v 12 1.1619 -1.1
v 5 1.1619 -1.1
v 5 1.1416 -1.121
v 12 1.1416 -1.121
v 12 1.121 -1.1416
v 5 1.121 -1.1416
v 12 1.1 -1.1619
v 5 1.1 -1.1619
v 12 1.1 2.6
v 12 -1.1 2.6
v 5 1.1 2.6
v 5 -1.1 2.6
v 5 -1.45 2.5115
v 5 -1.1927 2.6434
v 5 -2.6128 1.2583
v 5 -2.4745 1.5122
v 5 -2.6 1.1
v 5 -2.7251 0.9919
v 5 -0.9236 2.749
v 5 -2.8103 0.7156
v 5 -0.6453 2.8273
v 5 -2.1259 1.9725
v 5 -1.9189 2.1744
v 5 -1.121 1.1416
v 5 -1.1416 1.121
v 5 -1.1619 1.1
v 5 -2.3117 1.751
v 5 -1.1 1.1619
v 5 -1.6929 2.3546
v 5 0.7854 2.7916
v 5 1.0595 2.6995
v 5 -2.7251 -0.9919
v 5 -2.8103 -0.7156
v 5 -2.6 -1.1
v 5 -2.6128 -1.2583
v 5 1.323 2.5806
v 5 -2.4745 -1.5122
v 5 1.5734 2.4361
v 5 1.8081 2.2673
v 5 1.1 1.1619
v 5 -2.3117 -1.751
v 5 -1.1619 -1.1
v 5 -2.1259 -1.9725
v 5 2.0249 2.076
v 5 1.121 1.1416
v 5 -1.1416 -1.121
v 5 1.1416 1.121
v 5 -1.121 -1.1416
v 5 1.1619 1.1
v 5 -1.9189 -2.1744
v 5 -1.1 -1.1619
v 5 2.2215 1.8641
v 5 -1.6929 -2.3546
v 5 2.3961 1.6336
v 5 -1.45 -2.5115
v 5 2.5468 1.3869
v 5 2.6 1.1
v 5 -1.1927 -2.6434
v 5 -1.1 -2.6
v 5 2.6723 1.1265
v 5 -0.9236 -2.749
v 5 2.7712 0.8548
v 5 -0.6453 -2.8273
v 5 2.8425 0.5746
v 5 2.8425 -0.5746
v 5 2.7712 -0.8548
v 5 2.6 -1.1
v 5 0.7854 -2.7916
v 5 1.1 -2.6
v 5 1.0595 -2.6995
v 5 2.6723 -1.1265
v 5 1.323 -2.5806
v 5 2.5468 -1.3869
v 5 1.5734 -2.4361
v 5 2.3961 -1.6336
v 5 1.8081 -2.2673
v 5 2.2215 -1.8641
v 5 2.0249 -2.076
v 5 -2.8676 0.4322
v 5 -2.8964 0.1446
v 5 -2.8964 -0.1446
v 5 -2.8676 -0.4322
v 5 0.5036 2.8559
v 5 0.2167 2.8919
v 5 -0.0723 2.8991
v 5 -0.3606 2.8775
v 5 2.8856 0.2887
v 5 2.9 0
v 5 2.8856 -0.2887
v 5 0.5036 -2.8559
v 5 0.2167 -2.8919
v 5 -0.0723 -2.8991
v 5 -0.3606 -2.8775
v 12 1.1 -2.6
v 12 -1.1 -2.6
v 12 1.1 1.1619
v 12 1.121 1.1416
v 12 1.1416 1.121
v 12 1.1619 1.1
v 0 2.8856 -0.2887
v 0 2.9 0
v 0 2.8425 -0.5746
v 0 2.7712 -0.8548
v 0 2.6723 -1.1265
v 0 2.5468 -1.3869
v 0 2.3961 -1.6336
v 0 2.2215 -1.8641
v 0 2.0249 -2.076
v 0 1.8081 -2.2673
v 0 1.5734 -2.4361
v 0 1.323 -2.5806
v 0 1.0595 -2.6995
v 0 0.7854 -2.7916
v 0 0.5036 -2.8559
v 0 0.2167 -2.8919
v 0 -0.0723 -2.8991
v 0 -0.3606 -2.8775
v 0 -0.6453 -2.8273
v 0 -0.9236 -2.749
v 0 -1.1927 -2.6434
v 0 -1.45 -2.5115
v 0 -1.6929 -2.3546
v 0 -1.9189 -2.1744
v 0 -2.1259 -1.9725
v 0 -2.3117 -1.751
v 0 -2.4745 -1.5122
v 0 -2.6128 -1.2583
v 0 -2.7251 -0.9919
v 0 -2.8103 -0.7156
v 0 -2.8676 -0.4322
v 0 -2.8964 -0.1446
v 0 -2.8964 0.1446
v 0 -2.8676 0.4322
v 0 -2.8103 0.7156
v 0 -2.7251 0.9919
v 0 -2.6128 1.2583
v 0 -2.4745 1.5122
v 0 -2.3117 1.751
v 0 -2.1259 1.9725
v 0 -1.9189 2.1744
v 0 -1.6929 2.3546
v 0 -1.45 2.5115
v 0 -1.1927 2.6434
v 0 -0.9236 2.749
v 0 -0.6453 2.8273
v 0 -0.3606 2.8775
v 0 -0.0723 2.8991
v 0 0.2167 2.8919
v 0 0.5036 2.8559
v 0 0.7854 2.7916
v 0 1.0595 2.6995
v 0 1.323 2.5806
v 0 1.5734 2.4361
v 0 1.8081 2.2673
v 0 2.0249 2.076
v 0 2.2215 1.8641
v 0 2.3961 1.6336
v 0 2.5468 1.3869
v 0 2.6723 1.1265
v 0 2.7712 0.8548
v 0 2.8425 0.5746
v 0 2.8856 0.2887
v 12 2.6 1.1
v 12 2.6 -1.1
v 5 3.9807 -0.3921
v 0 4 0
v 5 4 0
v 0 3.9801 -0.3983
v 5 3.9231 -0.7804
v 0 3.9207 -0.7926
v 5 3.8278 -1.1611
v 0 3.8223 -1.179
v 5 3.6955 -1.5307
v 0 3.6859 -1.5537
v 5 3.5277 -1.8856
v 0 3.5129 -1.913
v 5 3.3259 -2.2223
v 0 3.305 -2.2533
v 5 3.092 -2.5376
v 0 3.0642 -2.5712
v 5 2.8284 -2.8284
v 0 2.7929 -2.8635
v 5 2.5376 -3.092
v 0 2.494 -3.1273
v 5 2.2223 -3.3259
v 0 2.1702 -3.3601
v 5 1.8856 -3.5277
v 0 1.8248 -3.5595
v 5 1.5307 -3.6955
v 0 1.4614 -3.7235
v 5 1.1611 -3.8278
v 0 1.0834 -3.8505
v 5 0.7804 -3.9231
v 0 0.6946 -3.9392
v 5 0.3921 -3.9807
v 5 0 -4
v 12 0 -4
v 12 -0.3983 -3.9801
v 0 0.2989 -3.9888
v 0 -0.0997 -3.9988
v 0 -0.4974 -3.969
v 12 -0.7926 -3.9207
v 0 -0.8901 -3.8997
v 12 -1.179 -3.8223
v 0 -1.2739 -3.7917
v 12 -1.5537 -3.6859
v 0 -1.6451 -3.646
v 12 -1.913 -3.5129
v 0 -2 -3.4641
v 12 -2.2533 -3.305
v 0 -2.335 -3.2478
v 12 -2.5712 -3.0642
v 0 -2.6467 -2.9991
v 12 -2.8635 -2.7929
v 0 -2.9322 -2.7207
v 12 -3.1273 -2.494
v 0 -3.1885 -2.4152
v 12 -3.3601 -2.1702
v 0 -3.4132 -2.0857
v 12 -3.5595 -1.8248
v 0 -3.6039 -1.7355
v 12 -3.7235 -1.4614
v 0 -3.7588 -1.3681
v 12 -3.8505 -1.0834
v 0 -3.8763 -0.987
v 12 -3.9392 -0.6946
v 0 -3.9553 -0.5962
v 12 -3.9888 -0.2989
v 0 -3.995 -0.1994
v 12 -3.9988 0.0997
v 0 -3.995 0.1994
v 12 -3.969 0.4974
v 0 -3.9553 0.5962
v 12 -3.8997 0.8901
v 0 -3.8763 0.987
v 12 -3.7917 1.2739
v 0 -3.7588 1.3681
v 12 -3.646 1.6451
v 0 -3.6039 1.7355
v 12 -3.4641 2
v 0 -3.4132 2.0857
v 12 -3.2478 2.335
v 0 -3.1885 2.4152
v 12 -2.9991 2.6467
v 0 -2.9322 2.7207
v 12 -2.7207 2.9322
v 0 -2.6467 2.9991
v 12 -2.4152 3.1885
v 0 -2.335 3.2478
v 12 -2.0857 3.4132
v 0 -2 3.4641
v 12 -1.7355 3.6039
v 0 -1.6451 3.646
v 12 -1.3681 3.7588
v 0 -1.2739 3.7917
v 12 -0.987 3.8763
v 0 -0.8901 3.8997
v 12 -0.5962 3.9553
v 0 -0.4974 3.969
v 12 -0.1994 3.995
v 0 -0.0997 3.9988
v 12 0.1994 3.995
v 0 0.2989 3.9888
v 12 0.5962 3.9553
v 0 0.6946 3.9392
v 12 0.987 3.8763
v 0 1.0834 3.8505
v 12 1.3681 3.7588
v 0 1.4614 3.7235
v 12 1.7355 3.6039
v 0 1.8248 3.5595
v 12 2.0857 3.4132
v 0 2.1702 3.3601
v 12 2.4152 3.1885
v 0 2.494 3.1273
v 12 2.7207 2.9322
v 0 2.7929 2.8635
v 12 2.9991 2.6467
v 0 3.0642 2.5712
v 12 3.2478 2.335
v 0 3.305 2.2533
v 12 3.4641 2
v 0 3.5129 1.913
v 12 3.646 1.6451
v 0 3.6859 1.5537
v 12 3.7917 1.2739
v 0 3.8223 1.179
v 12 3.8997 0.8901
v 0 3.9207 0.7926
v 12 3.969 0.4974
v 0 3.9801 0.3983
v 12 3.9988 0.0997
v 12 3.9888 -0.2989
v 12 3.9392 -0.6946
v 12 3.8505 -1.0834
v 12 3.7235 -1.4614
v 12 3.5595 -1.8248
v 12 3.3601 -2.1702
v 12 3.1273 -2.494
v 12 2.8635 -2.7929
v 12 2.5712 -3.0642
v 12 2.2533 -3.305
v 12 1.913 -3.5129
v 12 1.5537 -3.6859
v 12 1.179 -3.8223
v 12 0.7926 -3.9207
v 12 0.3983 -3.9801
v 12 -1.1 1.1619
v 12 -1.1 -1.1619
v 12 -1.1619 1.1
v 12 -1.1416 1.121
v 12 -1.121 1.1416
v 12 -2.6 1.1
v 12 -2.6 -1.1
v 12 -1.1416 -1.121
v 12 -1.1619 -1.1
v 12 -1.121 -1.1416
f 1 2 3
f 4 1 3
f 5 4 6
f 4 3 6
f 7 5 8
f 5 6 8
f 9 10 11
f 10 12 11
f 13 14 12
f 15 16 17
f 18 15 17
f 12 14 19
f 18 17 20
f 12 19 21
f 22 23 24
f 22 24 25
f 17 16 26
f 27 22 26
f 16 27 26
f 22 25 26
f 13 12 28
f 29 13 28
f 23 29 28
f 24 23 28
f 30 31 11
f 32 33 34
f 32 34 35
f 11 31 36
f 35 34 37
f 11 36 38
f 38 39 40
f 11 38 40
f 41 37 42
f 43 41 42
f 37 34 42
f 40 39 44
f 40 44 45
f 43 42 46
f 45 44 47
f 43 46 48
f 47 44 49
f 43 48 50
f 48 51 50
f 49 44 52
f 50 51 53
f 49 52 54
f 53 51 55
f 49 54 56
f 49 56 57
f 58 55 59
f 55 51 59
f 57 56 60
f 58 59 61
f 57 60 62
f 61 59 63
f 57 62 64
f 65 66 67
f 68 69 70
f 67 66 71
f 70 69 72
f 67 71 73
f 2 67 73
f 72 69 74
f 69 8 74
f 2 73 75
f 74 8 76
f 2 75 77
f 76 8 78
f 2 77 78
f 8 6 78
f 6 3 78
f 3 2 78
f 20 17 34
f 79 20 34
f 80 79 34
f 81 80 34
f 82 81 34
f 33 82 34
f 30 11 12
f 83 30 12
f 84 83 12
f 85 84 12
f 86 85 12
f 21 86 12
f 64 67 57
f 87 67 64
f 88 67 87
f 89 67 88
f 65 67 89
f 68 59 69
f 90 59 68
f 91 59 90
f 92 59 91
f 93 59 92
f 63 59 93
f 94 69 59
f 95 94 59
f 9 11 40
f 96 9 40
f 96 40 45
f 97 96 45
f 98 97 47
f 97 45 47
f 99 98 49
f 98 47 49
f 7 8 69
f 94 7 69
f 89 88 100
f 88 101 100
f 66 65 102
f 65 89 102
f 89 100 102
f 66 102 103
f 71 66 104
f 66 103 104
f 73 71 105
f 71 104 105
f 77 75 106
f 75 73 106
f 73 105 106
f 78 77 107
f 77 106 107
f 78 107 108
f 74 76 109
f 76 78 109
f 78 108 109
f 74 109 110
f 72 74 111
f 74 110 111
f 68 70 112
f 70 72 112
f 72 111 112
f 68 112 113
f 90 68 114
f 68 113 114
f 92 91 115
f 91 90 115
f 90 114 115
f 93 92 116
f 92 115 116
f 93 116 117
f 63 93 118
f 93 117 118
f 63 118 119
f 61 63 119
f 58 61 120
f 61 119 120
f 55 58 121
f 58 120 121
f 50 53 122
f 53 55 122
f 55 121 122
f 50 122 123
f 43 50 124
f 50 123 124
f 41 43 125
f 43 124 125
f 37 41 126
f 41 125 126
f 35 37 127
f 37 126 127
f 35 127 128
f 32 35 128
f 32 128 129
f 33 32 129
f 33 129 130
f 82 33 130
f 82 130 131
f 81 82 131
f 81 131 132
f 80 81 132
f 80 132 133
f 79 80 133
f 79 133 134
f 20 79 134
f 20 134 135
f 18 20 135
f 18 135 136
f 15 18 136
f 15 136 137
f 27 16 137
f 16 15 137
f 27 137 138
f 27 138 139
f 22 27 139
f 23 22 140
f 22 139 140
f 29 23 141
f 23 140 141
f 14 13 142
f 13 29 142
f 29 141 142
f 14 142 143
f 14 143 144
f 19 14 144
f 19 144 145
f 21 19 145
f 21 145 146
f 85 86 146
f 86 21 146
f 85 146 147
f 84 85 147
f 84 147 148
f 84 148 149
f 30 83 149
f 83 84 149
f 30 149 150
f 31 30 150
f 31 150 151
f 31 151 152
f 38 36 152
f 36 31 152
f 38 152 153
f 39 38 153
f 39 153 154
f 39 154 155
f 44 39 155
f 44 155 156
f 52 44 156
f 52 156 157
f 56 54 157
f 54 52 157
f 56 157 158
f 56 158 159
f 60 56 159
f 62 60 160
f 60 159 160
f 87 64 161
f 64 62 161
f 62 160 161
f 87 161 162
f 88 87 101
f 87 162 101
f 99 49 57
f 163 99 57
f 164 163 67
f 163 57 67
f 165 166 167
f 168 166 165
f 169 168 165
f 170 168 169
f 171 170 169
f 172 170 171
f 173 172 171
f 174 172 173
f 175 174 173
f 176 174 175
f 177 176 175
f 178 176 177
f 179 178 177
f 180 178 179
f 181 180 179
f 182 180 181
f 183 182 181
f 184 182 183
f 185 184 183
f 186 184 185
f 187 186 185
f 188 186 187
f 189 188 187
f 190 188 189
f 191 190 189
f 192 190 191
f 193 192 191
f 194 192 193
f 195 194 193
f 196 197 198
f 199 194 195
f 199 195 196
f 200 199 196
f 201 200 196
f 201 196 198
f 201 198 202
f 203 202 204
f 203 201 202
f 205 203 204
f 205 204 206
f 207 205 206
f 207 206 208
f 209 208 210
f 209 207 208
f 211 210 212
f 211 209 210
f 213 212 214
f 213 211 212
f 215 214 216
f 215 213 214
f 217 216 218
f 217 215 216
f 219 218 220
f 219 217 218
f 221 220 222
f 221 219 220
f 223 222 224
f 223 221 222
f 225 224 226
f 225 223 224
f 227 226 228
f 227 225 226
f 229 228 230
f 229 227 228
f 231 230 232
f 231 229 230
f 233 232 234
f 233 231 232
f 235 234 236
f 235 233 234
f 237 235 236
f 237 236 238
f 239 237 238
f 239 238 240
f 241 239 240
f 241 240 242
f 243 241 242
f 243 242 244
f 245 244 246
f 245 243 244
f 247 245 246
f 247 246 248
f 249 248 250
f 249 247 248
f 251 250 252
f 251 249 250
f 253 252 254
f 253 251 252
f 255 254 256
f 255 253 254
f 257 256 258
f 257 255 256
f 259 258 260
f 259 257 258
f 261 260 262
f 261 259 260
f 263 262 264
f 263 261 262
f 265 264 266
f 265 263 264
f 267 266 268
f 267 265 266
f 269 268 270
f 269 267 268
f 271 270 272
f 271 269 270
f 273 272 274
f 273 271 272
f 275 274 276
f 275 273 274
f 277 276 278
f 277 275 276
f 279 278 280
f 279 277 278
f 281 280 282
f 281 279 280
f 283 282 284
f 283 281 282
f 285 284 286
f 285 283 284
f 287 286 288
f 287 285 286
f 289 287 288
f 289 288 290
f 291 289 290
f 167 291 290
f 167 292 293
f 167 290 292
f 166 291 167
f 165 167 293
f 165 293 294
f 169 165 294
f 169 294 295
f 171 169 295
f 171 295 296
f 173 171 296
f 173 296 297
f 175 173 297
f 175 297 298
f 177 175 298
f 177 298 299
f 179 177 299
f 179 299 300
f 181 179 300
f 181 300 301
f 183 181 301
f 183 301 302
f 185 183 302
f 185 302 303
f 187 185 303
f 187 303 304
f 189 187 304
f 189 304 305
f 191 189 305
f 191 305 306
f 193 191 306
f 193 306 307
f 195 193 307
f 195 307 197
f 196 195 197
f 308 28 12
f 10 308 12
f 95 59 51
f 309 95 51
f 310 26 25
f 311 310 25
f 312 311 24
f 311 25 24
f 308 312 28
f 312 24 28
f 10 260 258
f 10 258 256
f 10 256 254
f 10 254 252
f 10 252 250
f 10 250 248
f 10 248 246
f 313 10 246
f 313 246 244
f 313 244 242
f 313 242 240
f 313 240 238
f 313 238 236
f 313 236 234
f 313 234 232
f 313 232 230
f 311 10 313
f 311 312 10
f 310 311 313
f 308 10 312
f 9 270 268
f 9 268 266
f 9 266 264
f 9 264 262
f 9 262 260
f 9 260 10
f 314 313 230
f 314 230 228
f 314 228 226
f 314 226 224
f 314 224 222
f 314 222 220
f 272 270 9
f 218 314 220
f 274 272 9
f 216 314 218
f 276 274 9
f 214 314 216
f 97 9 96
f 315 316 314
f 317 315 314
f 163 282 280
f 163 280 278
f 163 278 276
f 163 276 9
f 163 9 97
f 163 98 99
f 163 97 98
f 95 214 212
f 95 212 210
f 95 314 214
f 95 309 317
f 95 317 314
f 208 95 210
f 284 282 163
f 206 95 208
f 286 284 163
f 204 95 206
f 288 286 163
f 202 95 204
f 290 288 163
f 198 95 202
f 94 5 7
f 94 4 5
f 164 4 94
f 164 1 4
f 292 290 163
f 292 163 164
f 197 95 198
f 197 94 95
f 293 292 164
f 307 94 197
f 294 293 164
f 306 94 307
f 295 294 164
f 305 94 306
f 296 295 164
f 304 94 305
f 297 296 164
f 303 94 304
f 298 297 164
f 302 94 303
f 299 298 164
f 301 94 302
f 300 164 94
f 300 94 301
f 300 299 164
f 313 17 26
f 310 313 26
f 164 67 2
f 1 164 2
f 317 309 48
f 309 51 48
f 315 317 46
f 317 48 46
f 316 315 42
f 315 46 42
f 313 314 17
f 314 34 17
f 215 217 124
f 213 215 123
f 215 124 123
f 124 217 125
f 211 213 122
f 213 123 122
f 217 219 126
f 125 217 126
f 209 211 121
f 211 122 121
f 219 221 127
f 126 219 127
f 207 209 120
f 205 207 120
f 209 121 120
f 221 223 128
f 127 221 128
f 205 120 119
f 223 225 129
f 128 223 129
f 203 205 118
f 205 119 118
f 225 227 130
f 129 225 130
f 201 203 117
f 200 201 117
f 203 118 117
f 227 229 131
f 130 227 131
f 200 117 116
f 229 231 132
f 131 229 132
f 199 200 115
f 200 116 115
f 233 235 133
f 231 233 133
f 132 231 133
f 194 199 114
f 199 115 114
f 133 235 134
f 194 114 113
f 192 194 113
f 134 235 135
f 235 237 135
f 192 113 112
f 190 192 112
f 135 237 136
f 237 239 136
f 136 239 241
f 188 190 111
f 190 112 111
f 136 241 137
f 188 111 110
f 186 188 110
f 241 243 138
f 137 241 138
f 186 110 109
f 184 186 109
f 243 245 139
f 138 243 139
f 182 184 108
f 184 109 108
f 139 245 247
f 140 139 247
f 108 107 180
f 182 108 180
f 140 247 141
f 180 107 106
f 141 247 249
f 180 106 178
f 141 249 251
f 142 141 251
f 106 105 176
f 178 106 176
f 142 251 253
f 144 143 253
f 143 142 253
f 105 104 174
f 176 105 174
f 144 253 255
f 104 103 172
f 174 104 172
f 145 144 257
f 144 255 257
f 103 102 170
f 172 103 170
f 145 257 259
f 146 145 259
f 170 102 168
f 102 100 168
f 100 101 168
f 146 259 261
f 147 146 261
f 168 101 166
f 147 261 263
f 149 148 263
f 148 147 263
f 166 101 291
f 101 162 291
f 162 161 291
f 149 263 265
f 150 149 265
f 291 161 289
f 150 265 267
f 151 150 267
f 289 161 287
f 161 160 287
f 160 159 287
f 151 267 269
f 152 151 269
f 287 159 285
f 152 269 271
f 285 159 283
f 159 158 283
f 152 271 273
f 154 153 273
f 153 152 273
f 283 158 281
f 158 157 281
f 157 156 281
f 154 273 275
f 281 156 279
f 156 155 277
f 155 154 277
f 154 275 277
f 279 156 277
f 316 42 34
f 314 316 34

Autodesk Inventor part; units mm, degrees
ref_plane "YZ Plane" through (0, 0, 0) normal (1, 0, 0) x (0, 1, 0)
ref_plane "XZ Plane" through (0, 0, 0) normal (0, 1, 0) x (-1, 0, 0)
ref_plane "XY Plane" through (0, 0, 0) normal (0, 0, 1) x (1, 0, 0)
sketch "Boceto1" plane through (0, 0, 0) normal (1, 0, 0) x (0, 1, 0)
  circle A0 centre (0, 0) radius 2.9
  line L0 (0, 5) -> (0, 5)
  line L1 (5, 0) -> (5, 0)
  line L2 (0, -5) -> (0, -5)
  line L3 (-5, 0) -> (-5, 0)
  circle A1 centre (0, 0) radius 4
  dimension "d0" = 5.8
  dimension "d11" = 8
extrude "Extrusión1" add sketch "Boceto1" along normal blind 5
sketch "Boceto2" plane through (5, 0, 0) normal (1, 0, 0) x (0, 0, -1)
  line L0 (1.1, -2.6) -> (-1.1, -2.6)
  line L1 (-1.1, -2.6) -> (-1.1, 2.6)
  line L2 (-1.1, 2.6) -> (1.1, 2.6)
  line L3 (1.1, 2.6) -> (1.1, -2.6)
  line L4 (1.1, -2.6) -> (-1.1, 2.6)
  line L5 (-1.1, -2.6) -> (1.1, 2.6)
  line L6 (2.6, -1.1) -> (-2.6, -1.1)
  line L7 (-2.6, -1.1) -> (-2.6, 1.1)
  line L8 (-2.6, 1.1) -> (2.6, 1.1)
  line L9 (2.6, 1.1) -> (2.6, -1.1)
  line L10 (2.6, -1.1) -> (-2.6, 1.1)
  line L11 (-2.6, -1.1) -> (2.6, 1.1)
  circle A0 centre (0, 0) radius 1.6
  circle A1 centre (0, 0) radius 4 projected
  circle A2 centre (0, 0) radius 4
  point P0 (-1.1, -1.1619)
  point P1 (-1.1619, -1.1)
  point P2 (-1.1619, 1.1)
  point P3 (-1.1, 1.1619)
  point P4 (1.1, 1.1619)
  point P5 (1.1619, 1.1)
  point P6 (1.1619, -1.1)
  point P7 (1.1, -1.1619)
  dimension "d6" = 2.2
  dimension "d7" = 5.2
  dimension "d8" = 3.2
extrude "Extrusión2" add sketch "Boceto2" along normal blind 7
properties part number "AcopleMotor"
